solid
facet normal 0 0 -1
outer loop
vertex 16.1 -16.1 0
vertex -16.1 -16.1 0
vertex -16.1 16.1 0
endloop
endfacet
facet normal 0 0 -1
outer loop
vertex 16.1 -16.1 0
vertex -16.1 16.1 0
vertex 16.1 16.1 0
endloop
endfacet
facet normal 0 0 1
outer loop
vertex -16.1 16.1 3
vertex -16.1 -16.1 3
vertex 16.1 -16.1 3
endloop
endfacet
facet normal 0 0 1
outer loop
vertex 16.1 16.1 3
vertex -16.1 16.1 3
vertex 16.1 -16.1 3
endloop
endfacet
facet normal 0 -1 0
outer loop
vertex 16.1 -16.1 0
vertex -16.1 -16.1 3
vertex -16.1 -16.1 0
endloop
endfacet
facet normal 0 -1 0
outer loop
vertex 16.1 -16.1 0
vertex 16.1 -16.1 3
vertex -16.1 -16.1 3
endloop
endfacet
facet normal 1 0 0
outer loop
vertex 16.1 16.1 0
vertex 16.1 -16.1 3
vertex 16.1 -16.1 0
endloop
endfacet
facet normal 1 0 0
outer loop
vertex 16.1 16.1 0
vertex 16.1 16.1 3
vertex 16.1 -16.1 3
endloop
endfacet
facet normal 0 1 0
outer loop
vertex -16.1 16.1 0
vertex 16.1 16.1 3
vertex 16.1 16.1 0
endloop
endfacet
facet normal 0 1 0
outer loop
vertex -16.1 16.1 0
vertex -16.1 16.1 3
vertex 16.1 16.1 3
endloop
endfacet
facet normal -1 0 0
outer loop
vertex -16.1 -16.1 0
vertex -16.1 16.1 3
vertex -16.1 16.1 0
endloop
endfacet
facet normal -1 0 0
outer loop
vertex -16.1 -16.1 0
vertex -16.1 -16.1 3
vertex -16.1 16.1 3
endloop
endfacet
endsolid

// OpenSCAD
// file: ../diffuser.scad
// Swappable diffuser panel. Thickness is the STL knob; the diffusing structure
// (gyroid/grid, density, top/bottom solid layers = 0) is set in the slicer.

module diffuser_panel(t) {
    linear_extrude(t) square([panel_side, panel_side], center = true);
}
// file: ../config.scad
// ===== CHARGE LED sign — global config =====
// Edit this file; then run ./build.sh to regenerate every STL.

$fn = 72;

// ---- calibrated collar (press-fit for 12mm bullet pixel) ----
collar_stl    = "../../assets/bullet-collar.stl"; // path resolved from src/parts/ entry files
collar_h      = 2.0;     // Z span of the collar STL
collar_od     = 16.0;    // collar outer diameter
collar_cx     = 43.0;    // STL native X center (Y center is 0)
pixel_through = 12.3;    // clearance hole through the plate (just over bore Ø12.19)
dome_clear    = 9.0;     // lit dome protrusion above the rear plate — MEASURE on your pixel

// ---- shell ----
plate_t    = 2.0;        // rear plate thickness (== collar_h, so the collar sits flush)
wall_t     = 2.5;        // chimney wall thickness
cell_inner = 30;         // square interior of each test cell
lip_t      = 1.2;        // outer locating-lip thickness
lip_h      = 3.5;        // lip height above the seat (captures the panel)

// ---- diffuser panels ----
panel_clear  = 0.4;      // clearance so a panel drops into the lip
panel_thicks = [1, 2, 3];

// ---- coupon depth ladder ----
led_gaps = [20, 35, 50]; // clear LED-tip -> panel distance, per cell (mm)

// ---- derived ----
cell_pitch = cell_inner + 2 * wall_t;      // outer cell footprint (35)
n_cells    = len(led_gaps);
plate_w    = n_cells * cell_pitch;
plate_d    = cell_pitch;
panel_side = cell_pitch - 2 * lip_t - panel_clear;
function cell_x(i)     = i * cell_pitch + cell_pitch / 2;
function chimney_H(i)  = plate_t + dome_clear + led_gaps[i];
// main file
// Build target: 3mm diffuser panel.
include <../config.scad>
include <../diffuser.scad>
diffuser_panel(3);
